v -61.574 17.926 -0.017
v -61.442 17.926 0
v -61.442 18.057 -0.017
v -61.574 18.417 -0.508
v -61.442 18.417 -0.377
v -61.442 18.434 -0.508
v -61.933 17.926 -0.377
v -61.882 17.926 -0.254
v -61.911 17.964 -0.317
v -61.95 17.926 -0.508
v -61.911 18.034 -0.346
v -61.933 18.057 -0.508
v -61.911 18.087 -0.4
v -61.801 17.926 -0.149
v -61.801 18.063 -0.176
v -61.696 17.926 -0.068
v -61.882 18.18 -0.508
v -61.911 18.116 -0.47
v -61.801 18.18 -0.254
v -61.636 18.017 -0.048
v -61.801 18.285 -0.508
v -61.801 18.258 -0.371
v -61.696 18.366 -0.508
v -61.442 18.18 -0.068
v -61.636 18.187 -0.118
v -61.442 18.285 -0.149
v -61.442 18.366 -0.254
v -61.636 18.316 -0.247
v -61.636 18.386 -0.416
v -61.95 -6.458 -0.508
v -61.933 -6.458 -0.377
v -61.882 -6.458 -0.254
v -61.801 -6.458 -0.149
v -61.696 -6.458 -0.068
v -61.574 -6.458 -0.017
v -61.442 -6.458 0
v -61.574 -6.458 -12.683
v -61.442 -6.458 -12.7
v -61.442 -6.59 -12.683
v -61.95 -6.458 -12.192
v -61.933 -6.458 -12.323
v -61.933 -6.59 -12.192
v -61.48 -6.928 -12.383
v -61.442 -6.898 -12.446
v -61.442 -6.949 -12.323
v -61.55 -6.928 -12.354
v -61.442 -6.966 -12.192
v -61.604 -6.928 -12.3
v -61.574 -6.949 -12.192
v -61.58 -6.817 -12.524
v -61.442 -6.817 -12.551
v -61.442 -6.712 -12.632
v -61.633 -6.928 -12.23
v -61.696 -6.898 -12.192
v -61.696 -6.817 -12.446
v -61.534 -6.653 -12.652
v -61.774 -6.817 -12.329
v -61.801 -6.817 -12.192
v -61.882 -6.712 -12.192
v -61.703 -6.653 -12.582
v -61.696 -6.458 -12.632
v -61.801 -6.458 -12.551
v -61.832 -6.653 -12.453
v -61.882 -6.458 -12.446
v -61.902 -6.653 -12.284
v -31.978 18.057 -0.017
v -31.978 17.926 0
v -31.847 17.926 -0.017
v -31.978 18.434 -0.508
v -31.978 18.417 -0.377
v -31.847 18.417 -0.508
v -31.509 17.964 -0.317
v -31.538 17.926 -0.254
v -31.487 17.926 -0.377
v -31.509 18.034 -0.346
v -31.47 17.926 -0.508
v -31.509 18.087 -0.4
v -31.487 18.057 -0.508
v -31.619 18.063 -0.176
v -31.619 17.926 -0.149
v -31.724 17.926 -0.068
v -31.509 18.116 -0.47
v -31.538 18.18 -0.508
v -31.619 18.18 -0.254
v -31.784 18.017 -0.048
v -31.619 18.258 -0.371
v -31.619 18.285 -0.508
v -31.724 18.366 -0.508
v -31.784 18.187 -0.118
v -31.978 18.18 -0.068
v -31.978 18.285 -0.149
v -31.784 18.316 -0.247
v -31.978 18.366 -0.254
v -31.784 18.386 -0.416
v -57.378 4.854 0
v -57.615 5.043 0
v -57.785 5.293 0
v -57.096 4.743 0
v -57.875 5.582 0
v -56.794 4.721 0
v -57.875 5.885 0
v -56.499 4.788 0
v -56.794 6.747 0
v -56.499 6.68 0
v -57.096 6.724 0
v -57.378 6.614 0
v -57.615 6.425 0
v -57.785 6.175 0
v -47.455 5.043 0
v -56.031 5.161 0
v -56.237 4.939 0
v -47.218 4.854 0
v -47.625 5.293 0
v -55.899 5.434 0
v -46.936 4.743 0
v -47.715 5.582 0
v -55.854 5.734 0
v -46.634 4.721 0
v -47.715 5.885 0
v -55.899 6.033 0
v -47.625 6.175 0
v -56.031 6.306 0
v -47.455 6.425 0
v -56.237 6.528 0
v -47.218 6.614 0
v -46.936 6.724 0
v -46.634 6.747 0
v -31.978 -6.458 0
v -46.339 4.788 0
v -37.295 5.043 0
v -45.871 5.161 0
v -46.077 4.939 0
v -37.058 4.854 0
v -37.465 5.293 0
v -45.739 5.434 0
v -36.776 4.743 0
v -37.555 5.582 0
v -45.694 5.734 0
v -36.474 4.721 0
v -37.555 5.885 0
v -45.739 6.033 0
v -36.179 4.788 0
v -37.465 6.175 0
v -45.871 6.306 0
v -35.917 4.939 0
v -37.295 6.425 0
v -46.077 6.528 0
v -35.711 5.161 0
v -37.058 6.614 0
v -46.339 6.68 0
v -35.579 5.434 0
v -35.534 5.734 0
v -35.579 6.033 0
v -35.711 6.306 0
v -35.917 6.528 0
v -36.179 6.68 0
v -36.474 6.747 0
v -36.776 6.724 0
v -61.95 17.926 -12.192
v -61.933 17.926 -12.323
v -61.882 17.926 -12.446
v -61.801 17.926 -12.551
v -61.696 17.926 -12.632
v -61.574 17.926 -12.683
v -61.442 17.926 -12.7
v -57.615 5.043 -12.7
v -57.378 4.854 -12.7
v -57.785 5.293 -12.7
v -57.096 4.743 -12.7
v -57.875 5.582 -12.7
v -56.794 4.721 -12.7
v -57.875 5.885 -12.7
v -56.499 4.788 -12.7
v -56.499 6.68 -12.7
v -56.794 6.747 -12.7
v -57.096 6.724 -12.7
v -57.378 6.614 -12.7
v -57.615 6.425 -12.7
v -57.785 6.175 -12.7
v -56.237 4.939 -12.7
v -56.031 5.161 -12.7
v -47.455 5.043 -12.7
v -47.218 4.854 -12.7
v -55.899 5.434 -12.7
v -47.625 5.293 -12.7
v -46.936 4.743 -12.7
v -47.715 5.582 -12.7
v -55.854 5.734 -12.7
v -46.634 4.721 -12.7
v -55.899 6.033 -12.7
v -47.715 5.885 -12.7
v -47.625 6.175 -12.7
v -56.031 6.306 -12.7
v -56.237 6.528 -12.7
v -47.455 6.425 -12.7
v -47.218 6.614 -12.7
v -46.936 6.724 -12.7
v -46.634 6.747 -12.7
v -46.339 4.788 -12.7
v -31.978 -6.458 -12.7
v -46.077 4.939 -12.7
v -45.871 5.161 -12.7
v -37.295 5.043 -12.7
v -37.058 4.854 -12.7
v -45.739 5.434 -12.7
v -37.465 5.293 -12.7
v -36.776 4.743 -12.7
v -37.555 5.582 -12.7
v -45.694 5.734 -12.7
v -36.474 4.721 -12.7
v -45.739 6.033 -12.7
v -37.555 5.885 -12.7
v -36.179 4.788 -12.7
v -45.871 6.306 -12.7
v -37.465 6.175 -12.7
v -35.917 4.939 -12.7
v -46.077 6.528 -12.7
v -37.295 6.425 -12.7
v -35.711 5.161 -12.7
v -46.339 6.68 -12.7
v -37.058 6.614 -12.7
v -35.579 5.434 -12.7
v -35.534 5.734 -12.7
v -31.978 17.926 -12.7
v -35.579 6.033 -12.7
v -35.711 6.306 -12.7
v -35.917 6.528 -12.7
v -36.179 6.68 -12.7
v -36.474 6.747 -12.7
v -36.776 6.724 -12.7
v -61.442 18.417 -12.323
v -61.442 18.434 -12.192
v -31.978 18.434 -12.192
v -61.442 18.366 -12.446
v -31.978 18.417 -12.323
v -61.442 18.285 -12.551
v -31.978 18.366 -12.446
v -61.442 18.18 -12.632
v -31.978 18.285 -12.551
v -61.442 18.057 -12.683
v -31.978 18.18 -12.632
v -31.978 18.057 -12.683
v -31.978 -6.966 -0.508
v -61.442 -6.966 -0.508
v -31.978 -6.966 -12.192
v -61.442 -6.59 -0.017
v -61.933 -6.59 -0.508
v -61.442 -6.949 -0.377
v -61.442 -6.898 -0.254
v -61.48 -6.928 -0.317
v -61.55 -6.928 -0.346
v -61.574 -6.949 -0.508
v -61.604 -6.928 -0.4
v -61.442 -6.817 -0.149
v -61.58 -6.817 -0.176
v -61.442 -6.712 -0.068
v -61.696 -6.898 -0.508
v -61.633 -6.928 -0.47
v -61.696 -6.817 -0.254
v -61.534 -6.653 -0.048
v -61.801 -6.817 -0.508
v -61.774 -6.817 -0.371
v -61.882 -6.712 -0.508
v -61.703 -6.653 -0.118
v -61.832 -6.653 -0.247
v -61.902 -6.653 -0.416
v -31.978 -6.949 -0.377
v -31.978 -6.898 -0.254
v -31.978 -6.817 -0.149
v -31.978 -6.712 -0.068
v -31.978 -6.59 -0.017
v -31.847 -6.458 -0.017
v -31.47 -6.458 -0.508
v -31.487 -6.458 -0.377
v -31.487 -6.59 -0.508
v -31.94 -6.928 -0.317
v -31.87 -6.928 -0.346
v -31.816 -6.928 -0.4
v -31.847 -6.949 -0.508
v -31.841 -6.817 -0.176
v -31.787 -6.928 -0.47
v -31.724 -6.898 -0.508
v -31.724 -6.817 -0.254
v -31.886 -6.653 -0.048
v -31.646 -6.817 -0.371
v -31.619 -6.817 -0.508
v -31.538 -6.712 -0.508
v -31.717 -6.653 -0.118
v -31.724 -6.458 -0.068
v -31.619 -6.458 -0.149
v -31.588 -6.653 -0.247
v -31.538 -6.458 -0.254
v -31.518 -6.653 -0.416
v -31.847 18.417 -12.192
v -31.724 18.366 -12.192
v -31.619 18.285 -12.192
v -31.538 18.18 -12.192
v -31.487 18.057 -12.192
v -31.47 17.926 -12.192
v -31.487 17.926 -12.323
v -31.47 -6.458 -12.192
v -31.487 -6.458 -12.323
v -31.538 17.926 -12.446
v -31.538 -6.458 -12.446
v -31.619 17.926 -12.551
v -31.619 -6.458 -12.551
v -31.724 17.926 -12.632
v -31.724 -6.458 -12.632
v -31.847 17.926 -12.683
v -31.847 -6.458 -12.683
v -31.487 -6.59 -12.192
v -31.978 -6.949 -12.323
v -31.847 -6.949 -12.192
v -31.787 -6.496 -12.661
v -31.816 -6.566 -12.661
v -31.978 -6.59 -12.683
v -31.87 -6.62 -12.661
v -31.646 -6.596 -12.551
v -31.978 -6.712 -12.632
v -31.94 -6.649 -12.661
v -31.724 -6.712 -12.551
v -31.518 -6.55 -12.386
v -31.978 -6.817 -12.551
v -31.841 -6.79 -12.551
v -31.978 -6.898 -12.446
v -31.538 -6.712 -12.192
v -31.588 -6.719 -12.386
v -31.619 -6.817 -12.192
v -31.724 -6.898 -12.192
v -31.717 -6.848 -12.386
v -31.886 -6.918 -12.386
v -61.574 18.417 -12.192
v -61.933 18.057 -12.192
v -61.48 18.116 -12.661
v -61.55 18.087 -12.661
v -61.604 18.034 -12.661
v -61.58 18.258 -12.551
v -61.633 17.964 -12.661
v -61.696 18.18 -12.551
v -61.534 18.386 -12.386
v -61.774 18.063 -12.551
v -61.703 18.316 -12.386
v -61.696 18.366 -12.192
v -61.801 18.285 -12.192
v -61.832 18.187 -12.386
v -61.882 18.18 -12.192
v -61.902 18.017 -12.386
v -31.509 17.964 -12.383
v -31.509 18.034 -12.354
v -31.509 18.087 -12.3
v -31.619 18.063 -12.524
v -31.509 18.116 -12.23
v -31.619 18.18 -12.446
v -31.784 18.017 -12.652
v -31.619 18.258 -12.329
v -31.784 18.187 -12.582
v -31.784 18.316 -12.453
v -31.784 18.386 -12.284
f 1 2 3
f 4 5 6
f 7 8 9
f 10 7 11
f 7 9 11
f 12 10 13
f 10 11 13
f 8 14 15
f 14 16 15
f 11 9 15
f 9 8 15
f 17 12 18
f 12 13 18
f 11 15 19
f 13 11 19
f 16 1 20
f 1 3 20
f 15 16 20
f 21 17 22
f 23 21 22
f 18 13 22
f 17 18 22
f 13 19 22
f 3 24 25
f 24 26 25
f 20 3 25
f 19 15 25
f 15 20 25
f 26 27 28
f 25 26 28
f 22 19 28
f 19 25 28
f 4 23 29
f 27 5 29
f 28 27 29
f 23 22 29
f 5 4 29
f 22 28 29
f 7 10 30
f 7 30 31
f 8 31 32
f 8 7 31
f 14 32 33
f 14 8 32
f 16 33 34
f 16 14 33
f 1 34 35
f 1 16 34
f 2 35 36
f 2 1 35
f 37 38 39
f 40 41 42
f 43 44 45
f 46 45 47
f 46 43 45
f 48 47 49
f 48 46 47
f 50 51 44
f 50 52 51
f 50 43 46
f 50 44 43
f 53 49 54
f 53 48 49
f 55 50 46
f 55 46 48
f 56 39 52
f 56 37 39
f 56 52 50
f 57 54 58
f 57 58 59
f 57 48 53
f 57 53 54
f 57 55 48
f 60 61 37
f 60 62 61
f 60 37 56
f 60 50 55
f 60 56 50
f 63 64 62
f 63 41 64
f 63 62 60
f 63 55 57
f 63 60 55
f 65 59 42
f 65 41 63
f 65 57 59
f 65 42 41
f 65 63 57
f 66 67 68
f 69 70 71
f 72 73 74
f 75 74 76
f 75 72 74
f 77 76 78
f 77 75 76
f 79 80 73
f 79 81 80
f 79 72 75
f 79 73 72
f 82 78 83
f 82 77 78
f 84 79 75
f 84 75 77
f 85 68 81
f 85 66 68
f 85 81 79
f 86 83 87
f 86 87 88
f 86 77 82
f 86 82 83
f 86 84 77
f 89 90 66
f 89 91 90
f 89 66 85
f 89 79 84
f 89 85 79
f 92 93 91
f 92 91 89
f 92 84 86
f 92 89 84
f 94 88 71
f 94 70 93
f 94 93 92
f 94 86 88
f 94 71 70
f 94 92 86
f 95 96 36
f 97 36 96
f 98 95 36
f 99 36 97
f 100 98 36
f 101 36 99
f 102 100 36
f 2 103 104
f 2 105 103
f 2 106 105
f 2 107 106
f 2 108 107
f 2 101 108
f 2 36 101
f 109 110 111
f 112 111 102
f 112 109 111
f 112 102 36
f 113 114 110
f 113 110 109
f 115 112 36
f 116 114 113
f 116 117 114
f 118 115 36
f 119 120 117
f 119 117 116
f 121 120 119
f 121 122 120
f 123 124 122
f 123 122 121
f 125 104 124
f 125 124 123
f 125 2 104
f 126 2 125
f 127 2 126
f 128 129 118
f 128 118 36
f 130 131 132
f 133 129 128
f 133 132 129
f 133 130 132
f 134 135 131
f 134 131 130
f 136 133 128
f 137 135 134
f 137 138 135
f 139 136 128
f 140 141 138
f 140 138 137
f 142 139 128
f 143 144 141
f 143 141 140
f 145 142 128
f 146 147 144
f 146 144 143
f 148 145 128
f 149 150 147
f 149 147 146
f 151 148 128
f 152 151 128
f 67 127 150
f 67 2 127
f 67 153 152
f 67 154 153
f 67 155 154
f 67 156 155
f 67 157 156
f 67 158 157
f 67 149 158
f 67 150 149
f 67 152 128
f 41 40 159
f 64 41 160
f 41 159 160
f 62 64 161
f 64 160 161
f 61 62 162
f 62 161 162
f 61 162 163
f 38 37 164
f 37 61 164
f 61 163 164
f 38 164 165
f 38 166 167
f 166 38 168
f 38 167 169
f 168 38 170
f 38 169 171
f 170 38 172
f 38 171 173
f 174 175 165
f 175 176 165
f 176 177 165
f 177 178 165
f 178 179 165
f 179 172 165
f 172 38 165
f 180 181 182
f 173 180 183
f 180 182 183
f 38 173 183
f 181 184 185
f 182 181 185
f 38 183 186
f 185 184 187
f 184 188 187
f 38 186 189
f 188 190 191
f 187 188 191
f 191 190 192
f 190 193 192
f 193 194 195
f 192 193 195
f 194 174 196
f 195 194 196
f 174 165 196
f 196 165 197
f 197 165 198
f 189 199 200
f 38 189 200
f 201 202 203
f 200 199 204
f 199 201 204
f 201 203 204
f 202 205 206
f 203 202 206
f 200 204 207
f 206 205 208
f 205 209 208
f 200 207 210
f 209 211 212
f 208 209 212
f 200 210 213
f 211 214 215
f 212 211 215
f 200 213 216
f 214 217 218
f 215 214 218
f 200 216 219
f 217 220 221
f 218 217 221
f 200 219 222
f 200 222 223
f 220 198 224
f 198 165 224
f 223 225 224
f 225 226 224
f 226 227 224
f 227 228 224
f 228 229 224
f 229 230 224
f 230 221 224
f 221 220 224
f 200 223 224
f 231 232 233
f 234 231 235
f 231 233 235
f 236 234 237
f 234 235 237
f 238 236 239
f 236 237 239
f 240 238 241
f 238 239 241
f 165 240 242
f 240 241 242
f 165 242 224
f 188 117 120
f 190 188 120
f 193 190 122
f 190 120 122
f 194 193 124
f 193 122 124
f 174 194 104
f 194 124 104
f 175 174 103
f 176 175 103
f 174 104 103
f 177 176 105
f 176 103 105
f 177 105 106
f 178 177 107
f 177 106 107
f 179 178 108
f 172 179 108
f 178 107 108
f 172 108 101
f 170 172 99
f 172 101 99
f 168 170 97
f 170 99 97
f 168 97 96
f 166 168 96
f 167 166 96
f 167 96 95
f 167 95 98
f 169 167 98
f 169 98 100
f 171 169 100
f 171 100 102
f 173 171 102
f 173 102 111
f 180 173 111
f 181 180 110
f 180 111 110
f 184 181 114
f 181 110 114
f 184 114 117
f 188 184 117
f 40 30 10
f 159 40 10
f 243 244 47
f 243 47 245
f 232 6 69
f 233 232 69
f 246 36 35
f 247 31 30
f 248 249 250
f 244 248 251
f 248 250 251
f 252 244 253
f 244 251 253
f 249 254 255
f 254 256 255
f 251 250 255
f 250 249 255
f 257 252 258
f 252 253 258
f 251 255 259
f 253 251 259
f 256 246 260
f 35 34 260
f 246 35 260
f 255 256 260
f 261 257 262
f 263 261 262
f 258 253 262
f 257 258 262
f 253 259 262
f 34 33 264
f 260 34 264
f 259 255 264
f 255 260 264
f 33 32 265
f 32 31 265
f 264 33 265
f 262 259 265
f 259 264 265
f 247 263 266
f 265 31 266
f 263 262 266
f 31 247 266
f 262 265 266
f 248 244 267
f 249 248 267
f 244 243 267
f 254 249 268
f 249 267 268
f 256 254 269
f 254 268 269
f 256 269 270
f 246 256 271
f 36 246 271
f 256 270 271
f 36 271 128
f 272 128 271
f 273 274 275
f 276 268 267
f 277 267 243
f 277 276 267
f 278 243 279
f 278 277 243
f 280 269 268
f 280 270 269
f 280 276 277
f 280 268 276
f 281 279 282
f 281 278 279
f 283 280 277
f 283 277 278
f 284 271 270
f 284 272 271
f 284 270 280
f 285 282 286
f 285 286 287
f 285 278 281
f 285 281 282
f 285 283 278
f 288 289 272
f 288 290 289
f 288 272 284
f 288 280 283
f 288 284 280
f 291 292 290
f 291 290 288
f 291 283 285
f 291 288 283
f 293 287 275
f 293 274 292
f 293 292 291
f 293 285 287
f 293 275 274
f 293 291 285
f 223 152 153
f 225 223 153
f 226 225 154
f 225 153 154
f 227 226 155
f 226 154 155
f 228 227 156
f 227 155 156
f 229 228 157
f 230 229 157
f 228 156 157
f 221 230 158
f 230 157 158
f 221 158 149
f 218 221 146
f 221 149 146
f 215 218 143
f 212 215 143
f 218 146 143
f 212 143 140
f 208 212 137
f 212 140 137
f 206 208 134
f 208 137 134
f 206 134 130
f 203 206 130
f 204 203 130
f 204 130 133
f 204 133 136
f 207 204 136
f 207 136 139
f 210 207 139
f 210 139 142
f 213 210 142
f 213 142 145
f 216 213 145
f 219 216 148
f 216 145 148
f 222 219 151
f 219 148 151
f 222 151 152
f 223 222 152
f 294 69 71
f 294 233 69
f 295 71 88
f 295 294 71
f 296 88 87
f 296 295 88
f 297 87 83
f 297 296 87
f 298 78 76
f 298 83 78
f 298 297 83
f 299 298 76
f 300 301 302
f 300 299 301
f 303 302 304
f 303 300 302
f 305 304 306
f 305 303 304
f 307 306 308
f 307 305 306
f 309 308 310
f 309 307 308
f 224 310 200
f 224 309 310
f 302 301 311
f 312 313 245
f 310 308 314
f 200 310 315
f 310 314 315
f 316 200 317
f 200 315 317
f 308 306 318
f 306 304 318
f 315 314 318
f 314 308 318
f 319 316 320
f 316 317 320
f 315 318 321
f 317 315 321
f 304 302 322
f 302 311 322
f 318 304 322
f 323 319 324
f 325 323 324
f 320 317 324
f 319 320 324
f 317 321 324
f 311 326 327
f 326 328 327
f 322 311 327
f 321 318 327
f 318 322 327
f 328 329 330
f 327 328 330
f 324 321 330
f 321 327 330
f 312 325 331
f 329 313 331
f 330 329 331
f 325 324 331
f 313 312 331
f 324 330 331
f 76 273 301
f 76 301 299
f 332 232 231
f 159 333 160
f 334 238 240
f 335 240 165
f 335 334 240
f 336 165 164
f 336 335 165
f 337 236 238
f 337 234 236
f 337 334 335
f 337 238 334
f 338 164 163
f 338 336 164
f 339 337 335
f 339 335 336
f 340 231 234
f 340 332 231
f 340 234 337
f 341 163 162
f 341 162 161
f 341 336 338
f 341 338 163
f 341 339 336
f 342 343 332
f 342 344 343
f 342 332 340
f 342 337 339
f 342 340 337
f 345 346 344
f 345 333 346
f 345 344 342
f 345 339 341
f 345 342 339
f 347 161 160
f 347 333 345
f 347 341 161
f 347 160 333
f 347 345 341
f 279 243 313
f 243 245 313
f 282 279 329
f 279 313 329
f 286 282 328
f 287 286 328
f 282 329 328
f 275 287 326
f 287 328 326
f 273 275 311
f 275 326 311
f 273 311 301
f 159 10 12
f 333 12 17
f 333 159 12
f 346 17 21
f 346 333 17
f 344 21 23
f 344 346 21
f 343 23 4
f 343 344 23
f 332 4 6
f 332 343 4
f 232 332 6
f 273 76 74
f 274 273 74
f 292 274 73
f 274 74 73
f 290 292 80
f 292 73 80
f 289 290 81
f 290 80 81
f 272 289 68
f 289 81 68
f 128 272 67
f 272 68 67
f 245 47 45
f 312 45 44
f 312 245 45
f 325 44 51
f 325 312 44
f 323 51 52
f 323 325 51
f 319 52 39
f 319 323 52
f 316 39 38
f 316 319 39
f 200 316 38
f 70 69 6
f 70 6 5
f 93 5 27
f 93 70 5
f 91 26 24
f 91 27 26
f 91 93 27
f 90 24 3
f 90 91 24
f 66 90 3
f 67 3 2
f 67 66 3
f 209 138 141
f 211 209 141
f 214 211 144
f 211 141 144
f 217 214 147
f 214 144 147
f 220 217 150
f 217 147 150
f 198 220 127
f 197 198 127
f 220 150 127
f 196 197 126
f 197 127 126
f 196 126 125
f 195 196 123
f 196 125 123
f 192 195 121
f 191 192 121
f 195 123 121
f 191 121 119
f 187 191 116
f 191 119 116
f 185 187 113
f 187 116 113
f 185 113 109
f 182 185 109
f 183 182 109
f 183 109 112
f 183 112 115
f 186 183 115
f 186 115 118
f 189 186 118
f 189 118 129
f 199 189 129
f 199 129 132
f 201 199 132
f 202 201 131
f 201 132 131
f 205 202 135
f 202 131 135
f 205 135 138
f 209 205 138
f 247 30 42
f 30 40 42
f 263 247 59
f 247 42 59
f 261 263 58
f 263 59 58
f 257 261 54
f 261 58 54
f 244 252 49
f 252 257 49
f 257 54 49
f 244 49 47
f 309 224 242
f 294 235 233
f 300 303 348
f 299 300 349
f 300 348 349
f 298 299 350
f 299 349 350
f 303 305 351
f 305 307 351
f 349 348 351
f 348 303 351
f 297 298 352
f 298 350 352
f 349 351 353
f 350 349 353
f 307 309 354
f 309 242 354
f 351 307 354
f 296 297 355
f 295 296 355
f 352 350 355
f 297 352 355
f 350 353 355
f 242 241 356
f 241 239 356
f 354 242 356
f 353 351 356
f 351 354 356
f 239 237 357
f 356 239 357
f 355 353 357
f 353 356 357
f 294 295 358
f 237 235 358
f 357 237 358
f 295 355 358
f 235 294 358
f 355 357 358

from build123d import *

# Parameters (mm, degrees)
F0_W     = 30.48
F0_H     = 25.4
F0_R     = 1.016
F1_DEPTH = 12.7
F2_R     = 0.508


# Not quite as in the source:
# - a feature names something its author has since deleted; it is built from what else it names


with BuildPart() as f1:
    # F0 (on Top) → F1 (new body)
    with BuildSketch(Plane.XY):
        with Locations((-46.7100512166, 5.7338142046)):
            Rectangle(F0_W, F0_H)
        with Locations((-56.8700512166, 5.7338142046)):
            Circle(F0_R, mode=Mode.SUBTRACT)
        with Locations((-46.7100512166, 5.7338142046)):
            Circle(F0_R, mode=Mode.SUBTRACT)
        with Locations((-36.5500512166, 5.7338142046)):
            Circle(F0_R, mode=Mode.SUBTRACT)
    extrude(amount=-F1_DEPTH)

    # F2
    f2_edges = [f1.edges().sort_by_distance(p)[0] for p in [
        (-46.710051, 18.433814, 0),
        (-61.950051, 5.733814, 0),
        (-61.950051, 18.433814, -6.35),
        (-46.710051, 18.433814, -12.7),
        (-61.950051, 5.733814, -12.7),
        (-31.470051, 5.733814, 0),
        (-46.710051, -6.966186, 0),
        (-31.470051, -6.966186, -6.35),
        (-31.470051, 5.733814, -12.7),
        (-46.710051, -6.966186, -12.7),
        (-31.470051, 18.433814, -6.35),
        (-61.950051, -6.966186, -6.35),
    ]]
    fillet(f2_edges, radius=F2_R)


solid = f1.part
